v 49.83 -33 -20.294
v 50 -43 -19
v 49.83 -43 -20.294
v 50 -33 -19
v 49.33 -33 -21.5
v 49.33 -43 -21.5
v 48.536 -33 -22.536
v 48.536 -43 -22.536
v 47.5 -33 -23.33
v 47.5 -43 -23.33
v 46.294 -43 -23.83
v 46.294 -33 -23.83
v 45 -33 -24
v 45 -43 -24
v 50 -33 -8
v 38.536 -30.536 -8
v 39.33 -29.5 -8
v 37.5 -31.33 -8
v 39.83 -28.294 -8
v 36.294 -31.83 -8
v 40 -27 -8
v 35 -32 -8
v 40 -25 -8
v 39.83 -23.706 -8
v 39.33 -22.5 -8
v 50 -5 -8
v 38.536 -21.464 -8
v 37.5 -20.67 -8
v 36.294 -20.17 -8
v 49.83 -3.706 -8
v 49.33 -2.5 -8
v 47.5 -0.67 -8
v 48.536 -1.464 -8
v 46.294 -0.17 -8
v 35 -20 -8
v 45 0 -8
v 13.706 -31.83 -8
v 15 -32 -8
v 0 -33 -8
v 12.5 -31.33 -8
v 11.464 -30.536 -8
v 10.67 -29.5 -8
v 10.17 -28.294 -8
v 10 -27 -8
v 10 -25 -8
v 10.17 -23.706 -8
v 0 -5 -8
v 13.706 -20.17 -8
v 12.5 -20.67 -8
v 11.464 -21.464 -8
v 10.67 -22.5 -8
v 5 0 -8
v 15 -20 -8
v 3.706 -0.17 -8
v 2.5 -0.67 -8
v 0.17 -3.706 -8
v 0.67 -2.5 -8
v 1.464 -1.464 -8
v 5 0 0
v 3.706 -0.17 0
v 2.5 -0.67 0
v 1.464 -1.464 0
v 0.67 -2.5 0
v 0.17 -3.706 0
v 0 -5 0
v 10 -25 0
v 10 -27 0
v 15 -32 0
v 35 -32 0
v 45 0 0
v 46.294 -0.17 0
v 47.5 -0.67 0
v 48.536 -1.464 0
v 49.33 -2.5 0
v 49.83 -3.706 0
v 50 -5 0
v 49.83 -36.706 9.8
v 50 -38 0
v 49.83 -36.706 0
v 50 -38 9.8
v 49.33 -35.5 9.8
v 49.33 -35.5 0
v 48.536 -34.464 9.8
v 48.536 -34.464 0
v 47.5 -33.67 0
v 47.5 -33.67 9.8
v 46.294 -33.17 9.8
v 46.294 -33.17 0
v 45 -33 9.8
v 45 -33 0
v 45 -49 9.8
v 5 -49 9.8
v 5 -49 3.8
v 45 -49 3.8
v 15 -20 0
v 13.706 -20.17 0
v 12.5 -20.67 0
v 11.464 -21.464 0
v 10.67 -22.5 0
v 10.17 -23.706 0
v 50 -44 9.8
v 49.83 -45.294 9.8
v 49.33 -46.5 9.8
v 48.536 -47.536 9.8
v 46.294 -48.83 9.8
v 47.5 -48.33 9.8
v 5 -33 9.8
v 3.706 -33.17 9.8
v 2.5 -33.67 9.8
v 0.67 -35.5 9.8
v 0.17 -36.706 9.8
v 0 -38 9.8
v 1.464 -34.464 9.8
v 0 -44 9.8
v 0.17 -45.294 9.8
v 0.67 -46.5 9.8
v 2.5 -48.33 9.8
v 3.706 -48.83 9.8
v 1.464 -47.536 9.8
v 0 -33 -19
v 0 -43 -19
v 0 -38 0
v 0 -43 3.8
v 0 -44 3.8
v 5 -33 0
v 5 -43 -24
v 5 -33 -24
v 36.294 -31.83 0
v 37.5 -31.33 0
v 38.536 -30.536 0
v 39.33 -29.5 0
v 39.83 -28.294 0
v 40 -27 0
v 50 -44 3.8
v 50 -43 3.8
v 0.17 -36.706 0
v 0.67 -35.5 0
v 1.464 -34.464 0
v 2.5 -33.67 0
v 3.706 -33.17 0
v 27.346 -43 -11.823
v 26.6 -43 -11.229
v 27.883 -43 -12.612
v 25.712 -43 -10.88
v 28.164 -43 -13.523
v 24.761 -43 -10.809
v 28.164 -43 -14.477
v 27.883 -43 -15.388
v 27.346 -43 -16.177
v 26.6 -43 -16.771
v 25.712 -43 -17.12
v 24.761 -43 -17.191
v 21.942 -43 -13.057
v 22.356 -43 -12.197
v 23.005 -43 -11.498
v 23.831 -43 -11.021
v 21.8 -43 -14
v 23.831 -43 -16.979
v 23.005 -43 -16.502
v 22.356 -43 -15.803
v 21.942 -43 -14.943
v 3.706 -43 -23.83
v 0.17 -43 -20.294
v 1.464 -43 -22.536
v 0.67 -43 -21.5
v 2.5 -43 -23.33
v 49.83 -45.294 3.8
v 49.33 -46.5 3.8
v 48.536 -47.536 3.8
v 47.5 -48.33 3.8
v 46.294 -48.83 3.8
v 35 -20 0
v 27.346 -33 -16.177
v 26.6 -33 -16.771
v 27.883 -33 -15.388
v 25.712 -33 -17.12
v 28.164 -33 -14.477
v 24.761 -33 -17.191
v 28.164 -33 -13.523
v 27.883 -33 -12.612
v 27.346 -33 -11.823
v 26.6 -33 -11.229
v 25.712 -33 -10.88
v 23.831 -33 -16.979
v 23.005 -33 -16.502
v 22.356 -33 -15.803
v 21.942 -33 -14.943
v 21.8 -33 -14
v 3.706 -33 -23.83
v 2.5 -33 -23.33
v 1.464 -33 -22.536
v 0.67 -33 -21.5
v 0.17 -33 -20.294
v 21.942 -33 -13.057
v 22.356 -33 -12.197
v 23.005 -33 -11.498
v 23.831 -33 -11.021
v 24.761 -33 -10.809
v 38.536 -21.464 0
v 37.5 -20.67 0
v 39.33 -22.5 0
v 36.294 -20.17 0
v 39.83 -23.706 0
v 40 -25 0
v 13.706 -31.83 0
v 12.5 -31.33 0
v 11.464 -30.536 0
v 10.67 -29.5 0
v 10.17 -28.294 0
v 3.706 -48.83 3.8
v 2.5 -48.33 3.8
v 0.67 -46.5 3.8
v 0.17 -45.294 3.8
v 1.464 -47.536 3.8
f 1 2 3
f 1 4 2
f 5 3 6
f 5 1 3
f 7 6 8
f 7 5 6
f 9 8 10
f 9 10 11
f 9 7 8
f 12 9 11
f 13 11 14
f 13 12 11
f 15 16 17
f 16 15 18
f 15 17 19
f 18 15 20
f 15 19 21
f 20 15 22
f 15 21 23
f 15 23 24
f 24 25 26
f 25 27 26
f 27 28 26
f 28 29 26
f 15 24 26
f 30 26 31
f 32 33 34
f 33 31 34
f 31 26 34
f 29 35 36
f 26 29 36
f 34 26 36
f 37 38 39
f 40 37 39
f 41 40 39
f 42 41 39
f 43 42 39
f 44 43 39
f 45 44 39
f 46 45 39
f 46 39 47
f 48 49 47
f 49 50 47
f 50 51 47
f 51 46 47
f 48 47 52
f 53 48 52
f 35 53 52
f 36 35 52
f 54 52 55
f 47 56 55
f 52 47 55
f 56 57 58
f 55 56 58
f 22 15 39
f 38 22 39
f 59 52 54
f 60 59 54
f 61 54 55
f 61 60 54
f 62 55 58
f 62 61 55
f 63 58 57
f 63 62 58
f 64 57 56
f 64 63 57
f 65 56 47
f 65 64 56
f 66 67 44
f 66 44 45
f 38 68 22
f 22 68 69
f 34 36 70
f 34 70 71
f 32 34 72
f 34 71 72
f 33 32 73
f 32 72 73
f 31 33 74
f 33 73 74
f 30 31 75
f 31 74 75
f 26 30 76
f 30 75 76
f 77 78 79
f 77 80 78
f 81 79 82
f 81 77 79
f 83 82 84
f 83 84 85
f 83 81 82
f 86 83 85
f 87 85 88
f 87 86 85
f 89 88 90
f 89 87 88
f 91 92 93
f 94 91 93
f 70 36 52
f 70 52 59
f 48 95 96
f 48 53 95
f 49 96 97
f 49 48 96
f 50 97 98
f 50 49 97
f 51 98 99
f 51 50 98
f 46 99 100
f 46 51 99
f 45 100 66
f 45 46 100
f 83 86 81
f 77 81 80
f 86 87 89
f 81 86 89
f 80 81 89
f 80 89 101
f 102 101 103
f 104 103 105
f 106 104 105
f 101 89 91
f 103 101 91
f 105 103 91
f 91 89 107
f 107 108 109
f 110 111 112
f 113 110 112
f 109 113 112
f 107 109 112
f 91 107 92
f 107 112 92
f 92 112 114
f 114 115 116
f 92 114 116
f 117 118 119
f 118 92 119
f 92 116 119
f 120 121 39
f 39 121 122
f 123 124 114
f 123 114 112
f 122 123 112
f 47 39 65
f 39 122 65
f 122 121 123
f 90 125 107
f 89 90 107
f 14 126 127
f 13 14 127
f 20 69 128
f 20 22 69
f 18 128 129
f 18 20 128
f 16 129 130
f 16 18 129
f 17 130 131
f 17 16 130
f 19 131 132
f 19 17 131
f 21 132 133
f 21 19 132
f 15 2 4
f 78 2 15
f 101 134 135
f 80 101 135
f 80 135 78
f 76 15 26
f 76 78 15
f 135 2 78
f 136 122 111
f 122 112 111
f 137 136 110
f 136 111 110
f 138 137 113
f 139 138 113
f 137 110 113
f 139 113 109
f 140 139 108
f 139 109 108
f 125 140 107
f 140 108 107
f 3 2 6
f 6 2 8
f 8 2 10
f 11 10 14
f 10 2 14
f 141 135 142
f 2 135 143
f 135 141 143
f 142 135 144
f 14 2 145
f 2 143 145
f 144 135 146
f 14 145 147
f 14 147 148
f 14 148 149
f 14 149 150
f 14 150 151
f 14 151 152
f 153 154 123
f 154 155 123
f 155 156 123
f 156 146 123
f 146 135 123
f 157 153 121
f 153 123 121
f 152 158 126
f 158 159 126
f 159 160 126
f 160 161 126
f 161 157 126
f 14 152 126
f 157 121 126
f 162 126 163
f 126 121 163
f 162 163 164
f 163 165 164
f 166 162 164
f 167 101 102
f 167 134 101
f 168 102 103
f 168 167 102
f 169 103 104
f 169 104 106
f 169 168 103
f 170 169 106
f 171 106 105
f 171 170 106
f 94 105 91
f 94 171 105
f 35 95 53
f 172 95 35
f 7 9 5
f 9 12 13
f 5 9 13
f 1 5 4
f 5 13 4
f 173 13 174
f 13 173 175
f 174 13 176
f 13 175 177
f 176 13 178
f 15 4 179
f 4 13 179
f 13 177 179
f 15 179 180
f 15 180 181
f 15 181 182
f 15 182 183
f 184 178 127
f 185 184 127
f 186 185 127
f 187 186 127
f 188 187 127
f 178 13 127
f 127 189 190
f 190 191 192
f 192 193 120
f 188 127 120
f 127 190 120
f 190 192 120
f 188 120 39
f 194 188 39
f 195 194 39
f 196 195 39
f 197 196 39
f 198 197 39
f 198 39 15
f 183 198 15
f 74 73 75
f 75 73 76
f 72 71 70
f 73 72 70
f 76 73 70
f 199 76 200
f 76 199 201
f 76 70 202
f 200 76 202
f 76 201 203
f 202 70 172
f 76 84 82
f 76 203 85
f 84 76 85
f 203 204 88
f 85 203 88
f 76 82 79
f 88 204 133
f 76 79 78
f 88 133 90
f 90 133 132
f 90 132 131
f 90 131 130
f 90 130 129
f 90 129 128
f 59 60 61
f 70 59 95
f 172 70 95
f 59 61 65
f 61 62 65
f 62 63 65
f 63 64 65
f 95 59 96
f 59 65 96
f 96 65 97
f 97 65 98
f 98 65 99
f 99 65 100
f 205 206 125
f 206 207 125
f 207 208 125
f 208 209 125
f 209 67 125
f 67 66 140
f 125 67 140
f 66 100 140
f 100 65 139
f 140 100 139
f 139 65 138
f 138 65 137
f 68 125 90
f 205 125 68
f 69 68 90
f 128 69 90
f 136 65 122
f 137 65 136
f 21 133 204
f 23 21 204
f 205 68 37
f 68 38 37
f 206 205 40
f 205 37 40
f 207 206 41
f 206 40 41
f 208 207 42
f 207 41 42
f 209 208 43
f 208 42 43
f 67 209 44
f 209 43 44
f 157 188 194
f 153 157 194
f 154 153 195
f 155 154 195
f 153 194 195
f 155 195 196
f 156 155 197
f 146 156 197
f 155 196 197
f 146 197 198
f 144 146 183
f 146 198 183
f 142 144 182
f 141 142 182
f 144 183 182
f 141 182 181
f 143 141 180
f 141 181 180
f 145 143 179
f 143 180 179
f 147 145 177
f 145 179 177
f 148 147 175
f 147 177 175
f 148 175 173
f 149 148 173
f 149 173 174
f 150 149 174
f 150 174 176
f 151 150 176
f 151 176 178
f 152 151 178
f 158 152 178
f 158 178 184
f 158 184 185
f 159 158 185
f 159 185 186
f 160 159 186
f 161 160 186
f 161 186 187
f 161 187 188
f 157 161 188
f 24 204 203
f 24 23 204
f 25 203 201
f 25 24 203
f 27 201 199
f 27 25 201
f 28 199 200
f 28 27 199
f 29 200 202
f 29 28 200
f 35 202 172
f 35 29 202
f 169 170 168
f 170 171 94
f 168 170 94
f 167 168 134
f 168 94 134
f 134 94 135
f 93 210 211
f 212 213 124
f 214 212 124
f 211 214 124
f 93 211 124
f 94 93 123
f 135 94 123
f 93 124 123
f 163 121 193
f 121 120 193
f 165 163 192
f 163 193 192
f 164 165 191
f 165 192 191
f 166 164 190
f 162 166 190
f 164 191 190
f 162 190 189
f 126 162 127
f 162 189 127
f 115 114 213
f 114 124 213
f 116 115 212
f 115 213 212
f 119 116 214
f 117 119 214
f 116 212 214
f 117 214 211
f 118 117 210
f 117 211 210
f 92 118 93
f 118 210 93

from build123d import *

# Parameters (mm, degrees)
F1_DEPTH = 50
F3_R     = 3.2
F4_DEPTH = 16.001
F2_W     = 30
F2_H     = 12
F5_DEPTH = 24.001
F6_R     = 5


with BuildPart() as f1:
    # F0 (on Right) → F1 (new body)
    with BuildSketch(Plane.YZ):
        Polygon((0, -8), (0, 0), (-33, 0), (-33, 9.8), (-49, 9.8), (-49, 3.8), (-43, 3.8), (-43, -24), (-33, -24), (-33, -8), align=None)
    extrude(amount=F1_DEPTH)

    # F3 (on face) → F4 (cut, through all)
    with BuildSketch(Plane(origin=(0, -33, 0), x_dir=(-1, 0, 0), z_dir=(0, 1, 0))):
        with Locations((-25, -14)):
            Circle(F3_R)
    extrude(amount=-F4_DEPTH, mode=Mode.SUBTRACT)

    # F2 (on face) → F5 (cut, through all)
    with BuildSketch(Plane.XY):
        with Locations((25, -26)):
            Rectangle(F2_W, F2_H)
    extrude(amount=-F5_DEPTH, mode=Mode.SUBTRACT)

    # F6
    f6_edges = [f1.edges().sort_by_distance(p)[0] for p in [
        (50, 0, -4),
        (0, 0, -4),
        (50, -33, 4.9),
        (0, -33, 4.9),
        (50, -49, 6.8),
        (0, -49, 6.8),
        (50, -38, -24),
        (0, -38, -24),
        (10, -32, -4),
        (40, -32, -4),
        (40, -20, -4),
        (10, -20, -4),
    ]]
    fillet(f6_edges, radius=F6_R)


solid = f1.part
